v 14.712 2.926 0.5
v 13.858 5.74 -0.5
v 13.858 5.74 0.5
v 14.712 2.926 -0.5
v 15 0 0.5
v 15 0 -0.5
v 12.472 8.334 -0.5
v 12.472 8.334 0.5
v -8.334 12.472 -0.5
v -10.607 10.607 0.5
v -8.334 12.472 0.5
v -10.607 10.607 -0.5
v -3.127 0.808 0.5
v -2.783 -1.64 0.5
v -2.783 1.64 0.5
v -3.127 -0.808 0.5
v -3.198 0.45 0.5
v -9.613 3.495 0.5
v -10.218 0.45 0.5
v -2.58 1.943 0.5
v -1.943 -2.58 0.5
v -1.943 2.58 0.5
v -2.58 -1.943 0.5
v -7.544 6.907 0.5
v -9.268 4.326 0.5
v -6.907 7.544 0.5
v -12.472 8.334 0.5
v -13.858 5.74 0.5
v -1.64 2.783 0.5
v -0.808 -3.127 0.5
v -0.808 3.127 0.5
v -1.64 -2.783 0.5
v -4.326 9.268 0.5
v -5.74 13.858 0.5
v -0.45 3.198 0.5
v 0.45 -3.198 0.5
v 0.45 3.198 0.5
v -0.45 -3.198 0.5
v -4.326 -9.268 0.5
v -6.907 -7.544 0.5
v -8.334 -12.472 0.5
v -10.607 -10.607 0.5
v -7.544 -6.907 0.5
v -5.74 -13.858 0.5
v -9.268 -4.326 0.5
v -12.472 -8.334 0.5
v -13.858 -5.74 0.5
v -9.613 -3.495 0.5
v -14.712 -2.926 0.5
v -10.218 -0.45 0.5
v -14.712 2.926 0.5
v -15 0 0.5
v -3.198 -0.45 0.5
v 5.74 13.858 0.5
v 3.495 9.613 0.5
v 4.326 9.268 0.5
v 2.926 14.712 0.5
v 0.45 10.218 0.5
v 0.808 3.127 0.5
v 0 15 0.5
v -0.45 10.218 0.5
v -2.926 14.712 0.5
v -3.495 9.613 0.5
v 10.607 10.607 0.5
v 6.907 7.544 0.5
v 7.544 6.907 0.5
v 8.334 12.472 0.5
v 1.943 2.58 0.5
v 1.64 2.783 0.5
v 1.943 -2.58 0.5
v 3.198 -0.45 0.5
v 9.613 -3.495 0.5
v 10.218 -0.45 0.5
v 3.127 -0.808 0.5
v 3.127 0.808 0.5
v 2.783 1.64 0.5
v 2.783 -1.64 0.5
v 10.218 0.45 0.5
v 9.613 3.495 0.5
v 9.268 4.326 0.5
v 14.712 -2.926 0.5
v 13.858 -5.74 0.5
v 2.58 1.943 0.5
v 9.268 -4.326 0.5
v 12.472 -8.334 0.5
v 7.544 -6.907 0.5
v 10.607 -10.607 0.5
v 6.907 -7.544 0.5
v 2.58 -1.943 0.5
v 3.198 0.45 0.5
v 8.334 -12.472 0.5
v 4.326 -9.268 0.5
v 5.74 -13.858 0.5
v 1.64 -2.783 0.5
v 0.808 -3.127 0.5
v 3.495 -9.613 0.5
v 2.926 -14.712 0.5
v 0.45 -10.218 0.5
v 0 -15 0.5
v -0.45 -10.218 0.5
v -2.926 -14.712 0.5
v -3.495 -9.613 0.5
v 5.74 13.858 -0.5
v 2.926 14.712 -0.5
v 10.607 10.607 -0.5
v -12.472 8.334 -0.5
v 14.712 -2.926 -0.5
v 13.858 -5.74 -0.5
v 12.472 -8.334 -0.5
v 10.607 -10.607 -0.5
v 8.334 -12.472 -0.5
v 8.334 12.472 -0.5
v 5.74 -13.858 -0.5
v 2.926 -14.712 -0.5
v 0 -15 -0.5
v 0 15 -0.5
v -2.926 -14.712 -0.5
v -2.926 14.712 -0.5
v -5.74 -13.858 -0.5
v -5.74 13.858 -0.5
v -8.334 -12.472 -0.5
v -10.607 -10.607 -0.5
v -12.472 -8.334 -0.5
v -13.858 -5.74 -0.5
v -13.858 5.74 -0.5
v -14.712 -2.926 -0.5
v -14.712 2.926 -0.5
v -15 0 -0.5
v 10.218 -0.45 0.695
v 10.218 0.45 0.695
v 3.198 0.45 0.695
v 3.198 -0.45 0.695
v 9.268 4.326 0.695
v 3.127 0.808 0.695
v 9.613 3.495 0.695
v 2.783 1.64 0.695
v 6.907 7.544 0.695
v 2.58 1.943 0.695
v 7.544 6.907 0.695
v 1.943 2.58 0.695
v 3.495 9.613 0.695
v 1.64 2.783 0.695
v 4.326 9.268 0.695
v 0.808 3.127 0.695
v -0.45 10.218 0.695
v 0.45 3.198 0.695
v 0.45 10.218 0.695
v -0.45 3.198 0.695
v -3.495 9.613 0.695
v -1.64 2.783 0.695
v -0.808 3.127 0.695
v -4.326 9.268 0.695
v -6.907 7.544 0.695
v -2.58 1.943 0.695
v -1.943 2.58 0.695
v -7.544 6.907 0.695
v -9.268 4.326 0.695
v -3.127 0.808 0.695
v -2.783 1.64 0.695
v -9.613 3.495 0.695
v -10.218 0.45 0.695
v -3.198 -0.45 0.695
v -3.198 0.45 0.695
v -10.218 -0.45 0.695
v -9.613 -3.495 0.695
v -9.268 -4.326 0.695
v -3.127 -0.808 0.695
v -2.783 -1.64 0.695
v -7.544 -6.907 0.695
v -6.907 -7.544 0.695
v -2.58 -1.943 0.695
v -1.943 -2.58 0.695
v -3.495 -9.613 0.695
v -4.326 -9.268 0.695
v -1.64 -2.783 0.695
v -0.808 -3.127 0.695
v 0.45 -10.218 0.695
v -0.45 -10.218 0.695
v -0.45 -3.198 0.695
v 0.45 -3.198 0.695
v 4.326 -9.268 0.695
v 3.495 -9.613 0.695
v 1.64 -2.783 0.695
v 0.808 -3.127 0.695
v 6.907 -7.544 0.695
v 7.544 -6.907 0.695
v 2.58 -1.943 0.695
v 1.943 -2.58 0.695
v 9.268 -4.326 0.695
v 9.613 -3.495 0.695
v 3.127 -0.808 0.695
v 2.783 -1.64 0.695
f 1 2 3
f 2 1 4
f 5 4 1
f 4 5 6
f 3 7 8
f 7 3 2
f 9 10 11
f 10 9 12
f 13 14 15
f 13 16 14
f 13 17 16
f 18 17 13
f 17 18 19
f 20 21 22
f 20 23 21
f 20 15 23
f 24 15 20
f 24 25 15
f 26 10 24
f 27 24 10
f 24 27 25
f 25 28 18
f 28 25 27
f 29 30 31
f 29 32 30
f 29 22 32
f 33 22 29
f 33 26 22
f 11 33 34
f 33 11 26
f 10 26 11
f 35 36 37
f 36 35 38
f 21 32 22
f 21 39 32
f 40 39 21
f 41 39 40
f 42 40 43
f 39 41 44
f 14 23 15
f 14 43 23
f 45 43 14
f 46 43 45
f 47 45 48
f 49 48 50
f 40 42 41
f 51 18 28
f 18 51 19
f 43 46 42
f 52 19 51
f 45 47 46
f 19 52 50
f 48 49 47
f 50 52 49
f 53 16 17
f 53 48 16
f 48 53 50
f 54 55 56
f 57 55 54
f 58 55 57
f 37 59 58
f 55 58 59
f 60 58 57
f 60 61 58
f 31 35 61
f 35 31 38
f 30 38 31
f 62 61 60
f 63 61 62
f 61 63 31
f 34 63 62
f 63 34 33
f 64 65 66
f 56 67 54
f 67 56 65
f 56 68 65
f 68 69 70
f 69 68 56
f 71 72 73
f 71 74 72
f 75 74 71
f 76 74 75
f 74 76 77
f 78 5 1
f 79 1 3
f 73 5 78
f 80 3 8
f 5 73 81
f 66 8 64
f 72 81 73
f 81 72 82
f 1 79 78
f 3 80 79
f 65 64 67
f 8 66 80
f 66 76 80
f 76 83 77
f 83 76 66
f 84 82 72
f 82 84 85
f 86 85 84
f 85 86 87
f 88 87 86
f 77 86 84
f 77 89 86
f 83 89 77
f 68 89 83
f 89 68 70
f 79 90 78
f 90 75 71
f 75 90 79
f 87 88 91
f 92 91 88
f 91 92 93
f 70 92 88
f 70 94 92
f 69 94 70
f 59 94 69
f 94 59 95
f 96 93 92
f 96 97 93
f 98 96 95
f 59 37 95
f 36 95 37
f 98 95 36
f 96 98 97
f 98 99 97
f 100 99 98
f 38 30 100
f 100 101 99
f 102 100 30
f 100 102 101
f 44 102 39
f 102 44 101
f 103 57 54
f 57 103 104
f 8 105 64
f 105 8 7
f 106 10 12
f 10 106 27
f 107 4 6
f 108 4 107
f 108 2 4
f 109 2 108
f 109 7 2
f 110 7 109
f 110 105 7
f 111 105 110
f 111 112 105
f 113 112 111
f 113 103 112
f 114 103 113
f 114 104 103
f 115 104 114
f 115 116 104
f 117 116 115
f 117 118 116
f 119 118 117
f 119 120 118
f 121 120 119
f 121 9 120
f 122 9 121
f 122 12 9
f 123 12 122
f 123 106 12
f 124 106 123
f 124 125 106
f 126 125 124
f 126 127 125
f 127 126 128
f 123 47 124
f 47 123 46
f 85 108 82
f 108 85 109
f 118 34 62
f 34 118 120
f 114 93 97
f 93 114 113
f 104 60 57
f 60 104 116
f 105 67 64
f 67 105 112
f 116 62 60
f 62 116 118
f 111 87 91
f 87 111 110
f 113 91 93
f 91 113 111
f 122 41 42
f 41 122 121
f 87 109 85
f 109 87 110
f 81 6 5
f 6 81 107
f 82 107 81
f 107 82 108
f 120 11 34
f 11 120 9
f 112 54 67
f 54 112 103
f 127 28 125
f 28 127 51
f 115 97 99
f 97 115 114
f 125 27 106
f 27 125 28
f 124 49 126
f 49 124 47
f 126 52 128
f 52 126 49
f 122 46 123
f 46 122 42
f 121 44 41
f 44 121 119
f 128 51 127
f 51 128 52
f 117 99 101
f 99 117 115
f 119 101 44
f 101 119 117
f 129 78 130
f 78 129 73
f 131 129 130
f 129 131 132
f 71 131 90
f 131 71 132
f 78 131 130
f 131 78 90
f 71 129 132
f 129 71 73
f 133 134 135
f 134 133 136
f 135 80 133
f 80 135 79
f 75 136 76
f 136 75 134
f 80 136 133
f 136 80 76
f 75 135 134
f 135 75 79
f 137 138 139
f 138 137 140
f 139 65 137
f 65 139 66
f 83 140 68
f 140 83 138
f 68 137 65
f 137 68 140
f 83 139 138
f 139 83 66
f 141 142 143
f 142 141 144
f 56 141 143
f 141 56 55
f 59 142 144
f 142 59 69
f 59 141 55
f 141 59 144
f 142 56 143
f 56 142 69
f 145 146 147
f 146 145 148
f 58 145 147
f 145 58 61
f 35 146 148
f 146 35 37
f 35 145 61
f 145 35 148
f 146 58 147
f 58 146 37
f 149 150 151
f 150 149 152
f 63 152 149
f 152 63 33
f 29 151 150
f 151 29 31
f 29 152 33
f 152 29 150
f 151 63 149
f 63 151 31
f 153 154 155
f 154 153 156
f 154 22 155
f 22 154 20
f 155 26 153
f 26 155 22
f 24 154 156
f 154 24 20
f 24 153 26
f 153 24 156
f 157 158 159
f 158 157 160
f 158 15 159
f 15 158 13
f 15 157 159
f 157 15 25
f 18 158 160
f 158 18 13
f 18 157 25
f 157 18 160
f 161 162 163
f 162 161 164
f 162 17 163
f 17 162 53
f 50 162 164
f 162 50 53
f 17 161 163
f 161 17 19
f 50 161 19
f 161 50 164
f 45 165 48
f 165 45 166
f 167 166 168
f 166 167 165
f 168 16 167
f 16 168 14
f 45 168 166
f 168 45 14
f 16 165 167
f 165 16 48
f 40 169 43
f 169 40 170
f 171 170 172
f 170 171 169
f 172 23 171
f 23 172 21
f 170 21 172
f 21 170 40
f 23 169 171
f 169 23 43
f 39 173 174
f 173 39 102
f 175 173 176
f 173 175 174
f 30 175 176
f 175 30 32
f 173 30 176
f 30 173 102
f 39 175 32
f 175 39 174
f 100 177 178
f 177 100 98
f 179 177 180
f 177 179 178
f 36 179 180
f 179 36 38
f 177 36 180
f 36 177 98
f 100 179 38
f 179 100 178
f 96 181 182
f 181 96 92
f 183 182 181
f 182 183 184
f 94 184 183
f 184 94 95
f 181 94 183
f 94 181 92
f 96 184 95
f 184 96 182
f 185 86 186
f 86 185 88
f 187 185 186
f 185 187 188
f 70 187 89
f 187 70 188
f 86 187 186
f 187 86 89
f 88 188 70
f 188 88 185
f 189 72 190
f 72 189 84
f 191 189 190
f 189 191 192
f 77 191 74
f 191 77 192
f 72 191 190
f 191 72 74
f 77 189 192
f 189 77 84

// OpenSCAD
$fn=32;
 union() {
     cylinder(r=15.0, h=1.0, center=true);
     rotate(a=[0.0, 0.0, 0.0]) {
         translate([6.7082039324993685, 0.0, 0.595]) {
             union() {
                 cube([7.02, 0.9, 0.2], center=true);
            }

        }

    }

     rotate(a=[0.0, 0.0, 22.5]) {
         translate([6.7082039324993685, 0.0, 0.595]) {
             union() {
                 cube([7.02, 0.9, 0.2], center=true);
            }

        }

    }

     rotate(a=[0.0, 0.0, 45.0]) {
         translate([6.7082039324993685, 0.0, 0.595]) {
             union() {
                 cube([7.02, 0.9, 0.2], center=true);
            }

        }

    }

     rotate(a=[0.0, 0.0, 67.5]) {
         translate([6.7082039324993685, 0.0, 0.595]) {
             union() {
                 cube([7.02, 0.9, 0.2], center=true);
            }

        }

    }

     rotate(a=[0.0, 0.0, 90.0]) {
         translate([6.7082039324993685, 0.0, 0.595]) {
             union() {
                 cube([7.02, 0.9, 0.2], center=true);
            }

        }

    }

     rotate(a=[0.0, 0.0, 112.5]) {
         translate([6.7082039324993685, 0.0, 0.595]) {
             union() {
                 cube([7.02, 0.9, 0.2], center=true);
            }

        }

    }

     rotate(a=[0.0, 0.0, 135.0]) {
         translate([6.7082039324993685, 0.0, 0.595]) {
             union() {
                 cube([7.02, 0.9, 0.2], center=true);
            }

        }

    }

     rotate(a=[0.0, 0.0, 157.5]) {
         translate([6.7082039324993685, 0.0, 0.595]) {
             union() {
                 cube([7.02, 0.9, 0.2], center=true);
            }

        }

    }

     rotate(a=[0.0, 0.0, 180.0]) {
         translate([6.7082039324993685, 0.0, 0.595]) {
             union() {
                 cube([7.02, 0.9, 0.2], center=true);
            }

        }

    }

     rotate(a=[0.0, 0.0, 202.5]) {
         translate([6.7082039324993685, 0.0, 0.595]) {
             union() {
                 cube([7.02, 0.9, 0.2], center=true);
            }

        }

    }

     rotate(a=[0.0, 0.0, 225.0]) {
         translate([6.7082039324993685, 0.0, 0.595]) {
             union() {
                 cube([7.02, 0.9, 0.2], center=true);
            }

        }

    }

     rotate(a=[0.0, 0.0, 247.5]) {
         translate([6.7082039324993685, 0.0, 0.595]) {
             union() {
                 cube([7.02, 0.9, 0.2], center=true);
            }

        }

    }

     rotate(a=[0.0, 0.0, 270.0]) {
         translate([6.7082039324993685, 0.0, 0.595]) {
             union() {
                 cube([7.02, 0.9, 0.2], center=true);
            }

        }

    }

     rotate(a=[0.0, 0.0, 292.5]) {
         translate([6.7082039324993685, 0.0, 0.595]) {
             union() {
                 cube([7.02, 0.9, 0.2], center=true);
            }

        }

    }

     rotate(a=[0.0, 0.0, 315.0]) {
         translate([6.7082039324993685, 0.0, 0.595]) {
             union() {
                 cube([7.02, 0.9, 0.2], center=true);
            }

        }

    }

     rotate(a=[0.0, 0.0, 337.5]) {
         translate([6.7082039324993685, 0.0, 0.595]) {
             union() {
                 cube([7.02, 0.9, 0.2], center=true);
            }

        }

    }

}
